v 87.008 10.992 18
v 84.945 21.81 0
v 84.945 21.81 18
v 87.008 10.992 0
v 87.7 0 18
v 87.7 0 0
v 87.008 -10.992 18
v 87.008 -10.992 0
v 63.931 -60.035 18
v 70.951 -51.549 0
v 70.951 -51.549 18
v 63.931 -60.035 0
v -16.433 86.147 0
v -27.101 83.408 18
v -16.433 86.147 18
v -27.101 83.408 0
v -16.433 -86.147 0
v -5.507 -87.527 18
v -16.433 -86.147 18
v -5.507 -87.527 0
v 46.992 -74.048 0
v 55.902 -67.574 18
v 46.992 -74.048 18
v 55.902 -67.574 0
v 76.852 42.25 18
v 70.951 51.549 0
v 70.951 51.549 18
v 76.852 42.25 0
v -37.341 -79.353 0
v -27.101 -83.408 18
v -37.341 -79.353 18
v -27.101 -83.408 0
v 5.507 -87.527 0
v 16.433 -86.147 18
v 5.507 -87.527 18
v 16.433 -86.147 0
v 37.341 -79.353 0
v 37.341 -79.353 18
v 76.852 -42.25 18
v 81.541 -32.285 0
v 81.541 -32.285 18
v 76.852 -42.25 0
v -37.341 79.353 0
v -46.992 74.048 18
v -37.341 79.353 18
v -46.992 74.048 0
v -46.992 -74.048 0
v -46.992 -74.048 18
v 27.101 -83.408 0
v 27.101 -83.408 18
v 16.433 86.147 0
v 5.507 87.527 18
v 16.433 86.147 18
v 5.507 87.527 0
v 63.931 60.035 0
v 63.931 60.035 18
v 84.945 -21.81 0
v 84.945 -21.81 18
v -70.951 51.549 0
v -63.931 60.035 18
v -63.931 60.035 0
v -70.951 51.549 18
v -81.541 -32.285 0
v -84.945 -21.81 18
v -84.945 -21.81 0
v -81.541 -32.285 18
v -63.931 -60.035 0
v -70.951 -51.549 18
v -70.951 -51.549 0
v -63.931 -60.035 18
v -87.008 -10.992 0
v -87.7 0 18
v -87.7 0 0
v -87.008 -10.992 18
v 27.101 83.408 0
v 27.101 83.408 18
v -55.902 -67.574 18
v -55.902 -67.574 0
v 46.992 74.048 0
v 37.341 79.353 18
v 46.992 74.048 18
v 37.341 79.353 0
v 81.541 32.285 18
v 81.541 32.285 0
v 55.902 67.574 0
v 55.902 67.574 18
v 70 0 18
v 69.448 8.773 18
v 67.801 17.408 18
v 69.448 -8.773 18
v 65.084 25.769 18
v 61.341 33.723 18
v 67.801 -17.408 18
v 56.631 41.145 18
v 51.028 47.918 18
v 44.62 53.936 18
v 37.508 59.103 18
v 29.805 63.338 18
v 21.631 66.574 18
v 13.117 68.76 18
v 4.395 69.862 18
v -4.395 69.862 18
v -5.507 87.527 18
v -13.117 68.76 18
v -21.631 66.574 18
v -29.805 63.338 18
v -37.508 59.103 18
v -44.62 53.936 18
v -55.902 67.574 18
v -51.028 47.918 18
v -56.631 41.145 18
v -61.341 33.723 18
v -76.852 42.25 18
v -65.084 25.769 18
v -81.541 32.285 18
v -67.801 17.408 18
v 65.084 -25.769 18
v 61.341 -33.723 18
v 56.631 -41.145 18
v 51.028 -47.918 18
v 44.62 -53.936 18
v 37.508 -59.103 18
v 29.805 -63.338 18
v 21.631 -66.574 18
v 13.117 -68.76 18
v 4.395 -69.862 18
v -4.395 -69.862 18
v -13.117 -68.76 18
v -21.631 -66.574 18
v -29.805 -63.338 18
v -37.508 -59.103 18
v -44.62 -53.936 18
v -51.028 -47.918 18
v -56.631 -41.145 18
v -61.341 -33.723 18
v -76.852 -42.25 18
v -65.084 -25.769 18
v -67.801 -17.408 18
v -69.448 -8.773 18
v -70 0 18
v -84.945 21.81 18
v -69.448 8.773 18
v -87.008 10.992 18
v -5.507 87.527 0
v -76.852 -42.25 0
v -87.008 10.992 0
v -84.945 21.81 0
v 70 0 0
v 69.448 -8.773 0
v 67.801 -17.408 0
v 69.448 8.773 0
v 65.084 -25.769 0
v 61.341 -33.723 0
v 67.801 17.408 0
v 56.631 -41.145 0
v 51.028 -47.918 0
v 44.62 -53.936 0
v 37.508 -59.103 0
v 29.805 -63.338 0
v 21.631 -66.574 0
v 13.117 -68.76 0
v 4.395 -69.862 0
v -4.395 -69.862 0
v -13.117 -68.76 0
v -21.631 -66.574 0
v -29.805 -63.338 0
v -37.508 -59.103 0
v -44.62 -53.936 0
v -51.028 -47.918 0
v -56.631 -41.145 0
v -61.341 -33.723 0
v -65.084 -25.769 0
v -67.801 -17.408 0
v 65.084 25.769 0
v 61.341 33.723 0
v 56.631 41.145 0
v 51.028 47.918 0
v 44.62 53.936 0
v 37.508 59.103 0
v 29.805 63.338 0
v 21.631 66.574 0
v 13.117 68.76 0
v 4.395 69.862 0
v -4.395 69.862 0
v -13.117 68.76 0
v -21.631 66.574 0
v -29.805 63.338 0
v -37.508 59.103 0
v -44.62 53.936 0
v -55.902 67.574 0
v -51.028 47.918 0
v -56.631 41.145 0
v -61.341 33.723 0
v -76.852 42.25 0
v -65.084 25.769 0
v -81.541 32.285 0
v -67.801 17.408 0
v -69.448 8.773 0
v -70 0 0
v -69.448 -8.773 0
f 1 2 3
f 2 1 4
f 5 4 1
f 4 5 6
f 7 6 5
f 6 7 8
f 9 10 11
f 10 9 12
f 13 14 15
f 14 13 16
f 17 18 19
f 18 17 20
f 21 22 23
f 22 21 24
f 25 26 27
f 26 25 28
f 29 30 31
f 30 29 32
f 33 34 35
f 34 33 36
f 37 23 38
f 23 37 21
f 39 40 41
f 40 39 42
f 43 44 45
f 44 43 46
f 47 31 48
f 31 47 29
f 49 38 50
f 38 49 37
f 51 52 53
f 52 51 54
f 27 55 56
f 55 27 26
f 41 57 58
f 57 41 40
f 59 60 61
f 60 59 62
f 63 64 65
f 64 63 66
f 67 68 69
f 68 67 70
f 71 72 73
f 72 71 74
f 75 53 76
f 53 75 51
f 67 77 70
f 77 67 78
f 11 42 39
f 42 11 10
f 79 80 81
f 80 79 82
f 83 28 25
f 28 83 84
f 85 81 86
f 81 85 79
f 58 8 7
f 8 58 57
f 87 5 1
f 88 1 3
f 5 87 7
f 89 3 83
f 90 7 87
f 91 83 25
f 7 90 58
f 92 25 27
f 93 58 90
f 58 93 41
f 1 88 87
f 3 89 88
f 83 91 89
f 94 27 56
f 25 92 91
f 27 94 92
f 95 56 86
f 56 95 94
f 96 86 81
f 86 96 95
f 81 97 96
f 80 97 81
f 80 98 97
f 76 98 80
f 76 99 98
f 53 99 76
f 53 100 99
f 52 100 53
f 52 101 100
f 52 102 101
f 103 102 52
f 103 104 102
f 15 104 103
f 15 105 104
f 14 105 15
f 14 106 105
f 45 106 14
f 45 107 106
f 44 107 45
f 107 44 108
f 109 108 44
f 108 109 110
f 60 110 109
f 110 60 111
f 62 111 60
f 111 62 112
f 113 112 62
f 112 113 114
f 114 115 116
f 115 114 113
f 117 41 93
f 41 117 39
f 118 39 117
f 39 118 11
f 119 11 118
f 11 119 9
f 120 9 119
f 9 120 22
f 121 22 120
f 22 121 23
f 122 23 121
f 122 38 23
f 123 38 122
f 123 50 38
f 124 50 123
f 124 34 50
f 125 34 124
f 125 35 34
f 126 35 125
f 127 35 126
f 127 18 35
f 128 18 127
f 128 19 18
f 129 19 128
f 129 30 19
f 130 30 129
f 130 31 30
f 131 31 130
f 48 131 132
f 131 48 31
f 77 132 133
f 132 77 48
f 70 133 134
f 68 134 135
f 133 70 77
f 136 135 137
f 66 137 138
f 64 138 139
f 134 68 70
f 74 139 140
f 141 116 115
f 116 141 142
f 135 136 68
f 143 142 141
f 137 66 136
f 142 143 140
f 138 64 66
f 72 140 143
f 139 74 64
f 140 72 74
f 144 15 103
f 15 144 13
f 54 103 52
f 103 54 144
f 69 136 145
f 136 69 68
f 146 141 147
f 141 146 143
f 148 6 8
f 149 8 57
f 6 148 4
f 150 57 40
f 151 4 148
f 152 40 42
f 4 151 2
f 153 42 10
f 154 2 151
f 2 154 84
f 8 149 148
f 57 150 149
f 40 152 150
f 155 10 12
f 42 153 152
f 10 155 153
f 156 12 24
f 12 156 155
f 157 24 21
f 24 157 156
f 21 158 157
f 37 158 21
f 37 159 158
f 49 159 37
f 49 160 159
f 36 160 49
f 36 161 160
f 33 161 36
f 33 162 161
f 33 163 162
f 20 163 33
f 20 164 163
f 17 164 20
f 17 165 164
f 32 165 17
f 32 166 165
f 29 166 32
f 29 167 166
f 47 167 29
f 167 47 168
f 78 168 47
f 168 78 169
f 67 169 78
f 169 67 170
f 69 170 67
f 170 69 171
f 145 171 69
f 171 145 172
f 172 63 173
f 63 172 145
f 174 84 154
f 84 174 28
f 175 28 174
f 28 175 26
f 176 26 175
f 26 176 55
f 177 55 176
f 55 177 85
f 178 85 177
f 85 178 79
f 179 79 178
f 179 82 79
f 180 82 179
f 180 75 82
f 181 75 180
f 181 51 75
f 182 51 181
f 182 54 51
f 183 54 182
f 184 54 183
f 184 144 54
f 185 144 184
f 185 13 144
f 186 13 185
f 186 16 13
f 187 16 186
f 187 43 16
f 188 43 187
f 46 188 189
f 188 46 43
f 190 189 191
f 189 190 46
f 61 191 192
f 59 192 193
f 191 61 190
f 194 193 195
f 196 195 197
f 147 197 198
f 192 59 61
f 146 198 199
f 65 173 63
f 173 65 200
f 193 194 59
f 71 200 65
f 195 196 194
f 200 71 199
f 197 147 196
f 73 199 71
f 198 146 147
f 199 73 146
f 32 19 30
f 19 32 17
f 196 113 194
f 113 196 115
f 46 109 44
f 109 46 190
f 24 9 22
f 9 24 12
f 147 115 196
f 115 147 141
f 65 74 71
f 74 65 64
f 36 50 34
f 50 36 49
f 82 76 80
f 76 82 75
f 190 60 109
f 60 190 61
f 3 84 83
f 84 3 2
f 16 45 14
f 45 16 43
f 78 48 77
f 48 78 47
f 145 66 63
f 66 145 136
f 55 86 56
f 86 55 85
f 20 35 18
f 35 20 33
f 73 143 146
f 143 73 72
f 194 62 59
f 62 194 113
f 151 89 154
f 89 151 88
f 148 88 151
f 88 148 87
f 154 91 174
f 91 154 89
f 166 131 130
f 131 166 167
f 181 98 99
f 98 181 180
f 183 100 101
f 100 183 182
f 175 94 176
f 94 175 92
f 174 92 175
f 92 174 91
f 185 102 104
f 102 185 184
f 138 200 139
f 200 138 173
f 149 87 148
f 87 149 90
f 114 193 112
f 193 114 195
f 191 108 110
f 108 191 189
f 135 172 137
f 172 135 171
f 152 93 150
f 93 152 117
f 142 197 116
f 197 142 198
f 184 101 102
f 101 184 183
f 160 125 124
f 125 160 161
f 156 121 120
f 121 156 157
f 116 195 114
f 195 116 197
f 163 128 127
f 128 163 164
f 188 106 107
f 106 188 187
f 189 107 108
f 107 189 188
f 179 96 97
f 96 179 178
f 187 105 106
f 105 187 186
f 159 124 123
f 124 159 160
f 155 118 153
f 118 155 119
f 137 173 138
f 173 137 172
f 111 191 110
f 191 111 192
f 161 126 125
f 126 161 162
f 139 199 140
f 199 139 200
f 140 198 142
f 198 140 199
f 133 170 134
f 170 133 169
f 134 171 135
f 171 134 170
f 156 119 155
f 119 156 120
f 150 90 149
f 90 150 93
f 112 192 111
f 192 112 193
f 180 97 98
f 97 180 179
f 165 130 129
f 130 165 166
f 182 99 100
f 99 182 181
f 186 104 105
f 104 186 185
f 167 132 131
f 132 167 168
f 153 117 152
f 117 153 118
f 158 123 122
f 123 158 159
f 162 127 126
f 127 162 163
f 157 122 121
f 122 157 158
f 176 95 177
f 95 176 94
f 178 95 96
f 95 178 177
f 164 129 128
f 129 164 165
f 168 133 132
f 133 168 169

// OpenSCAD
$fn = 50;


difference() {
	union() {
		cylinder(h = 18, r = 87.7000000000);
	}
	union() {
		cylinder(h = 18, r = 70.0000000000);
	}
}
